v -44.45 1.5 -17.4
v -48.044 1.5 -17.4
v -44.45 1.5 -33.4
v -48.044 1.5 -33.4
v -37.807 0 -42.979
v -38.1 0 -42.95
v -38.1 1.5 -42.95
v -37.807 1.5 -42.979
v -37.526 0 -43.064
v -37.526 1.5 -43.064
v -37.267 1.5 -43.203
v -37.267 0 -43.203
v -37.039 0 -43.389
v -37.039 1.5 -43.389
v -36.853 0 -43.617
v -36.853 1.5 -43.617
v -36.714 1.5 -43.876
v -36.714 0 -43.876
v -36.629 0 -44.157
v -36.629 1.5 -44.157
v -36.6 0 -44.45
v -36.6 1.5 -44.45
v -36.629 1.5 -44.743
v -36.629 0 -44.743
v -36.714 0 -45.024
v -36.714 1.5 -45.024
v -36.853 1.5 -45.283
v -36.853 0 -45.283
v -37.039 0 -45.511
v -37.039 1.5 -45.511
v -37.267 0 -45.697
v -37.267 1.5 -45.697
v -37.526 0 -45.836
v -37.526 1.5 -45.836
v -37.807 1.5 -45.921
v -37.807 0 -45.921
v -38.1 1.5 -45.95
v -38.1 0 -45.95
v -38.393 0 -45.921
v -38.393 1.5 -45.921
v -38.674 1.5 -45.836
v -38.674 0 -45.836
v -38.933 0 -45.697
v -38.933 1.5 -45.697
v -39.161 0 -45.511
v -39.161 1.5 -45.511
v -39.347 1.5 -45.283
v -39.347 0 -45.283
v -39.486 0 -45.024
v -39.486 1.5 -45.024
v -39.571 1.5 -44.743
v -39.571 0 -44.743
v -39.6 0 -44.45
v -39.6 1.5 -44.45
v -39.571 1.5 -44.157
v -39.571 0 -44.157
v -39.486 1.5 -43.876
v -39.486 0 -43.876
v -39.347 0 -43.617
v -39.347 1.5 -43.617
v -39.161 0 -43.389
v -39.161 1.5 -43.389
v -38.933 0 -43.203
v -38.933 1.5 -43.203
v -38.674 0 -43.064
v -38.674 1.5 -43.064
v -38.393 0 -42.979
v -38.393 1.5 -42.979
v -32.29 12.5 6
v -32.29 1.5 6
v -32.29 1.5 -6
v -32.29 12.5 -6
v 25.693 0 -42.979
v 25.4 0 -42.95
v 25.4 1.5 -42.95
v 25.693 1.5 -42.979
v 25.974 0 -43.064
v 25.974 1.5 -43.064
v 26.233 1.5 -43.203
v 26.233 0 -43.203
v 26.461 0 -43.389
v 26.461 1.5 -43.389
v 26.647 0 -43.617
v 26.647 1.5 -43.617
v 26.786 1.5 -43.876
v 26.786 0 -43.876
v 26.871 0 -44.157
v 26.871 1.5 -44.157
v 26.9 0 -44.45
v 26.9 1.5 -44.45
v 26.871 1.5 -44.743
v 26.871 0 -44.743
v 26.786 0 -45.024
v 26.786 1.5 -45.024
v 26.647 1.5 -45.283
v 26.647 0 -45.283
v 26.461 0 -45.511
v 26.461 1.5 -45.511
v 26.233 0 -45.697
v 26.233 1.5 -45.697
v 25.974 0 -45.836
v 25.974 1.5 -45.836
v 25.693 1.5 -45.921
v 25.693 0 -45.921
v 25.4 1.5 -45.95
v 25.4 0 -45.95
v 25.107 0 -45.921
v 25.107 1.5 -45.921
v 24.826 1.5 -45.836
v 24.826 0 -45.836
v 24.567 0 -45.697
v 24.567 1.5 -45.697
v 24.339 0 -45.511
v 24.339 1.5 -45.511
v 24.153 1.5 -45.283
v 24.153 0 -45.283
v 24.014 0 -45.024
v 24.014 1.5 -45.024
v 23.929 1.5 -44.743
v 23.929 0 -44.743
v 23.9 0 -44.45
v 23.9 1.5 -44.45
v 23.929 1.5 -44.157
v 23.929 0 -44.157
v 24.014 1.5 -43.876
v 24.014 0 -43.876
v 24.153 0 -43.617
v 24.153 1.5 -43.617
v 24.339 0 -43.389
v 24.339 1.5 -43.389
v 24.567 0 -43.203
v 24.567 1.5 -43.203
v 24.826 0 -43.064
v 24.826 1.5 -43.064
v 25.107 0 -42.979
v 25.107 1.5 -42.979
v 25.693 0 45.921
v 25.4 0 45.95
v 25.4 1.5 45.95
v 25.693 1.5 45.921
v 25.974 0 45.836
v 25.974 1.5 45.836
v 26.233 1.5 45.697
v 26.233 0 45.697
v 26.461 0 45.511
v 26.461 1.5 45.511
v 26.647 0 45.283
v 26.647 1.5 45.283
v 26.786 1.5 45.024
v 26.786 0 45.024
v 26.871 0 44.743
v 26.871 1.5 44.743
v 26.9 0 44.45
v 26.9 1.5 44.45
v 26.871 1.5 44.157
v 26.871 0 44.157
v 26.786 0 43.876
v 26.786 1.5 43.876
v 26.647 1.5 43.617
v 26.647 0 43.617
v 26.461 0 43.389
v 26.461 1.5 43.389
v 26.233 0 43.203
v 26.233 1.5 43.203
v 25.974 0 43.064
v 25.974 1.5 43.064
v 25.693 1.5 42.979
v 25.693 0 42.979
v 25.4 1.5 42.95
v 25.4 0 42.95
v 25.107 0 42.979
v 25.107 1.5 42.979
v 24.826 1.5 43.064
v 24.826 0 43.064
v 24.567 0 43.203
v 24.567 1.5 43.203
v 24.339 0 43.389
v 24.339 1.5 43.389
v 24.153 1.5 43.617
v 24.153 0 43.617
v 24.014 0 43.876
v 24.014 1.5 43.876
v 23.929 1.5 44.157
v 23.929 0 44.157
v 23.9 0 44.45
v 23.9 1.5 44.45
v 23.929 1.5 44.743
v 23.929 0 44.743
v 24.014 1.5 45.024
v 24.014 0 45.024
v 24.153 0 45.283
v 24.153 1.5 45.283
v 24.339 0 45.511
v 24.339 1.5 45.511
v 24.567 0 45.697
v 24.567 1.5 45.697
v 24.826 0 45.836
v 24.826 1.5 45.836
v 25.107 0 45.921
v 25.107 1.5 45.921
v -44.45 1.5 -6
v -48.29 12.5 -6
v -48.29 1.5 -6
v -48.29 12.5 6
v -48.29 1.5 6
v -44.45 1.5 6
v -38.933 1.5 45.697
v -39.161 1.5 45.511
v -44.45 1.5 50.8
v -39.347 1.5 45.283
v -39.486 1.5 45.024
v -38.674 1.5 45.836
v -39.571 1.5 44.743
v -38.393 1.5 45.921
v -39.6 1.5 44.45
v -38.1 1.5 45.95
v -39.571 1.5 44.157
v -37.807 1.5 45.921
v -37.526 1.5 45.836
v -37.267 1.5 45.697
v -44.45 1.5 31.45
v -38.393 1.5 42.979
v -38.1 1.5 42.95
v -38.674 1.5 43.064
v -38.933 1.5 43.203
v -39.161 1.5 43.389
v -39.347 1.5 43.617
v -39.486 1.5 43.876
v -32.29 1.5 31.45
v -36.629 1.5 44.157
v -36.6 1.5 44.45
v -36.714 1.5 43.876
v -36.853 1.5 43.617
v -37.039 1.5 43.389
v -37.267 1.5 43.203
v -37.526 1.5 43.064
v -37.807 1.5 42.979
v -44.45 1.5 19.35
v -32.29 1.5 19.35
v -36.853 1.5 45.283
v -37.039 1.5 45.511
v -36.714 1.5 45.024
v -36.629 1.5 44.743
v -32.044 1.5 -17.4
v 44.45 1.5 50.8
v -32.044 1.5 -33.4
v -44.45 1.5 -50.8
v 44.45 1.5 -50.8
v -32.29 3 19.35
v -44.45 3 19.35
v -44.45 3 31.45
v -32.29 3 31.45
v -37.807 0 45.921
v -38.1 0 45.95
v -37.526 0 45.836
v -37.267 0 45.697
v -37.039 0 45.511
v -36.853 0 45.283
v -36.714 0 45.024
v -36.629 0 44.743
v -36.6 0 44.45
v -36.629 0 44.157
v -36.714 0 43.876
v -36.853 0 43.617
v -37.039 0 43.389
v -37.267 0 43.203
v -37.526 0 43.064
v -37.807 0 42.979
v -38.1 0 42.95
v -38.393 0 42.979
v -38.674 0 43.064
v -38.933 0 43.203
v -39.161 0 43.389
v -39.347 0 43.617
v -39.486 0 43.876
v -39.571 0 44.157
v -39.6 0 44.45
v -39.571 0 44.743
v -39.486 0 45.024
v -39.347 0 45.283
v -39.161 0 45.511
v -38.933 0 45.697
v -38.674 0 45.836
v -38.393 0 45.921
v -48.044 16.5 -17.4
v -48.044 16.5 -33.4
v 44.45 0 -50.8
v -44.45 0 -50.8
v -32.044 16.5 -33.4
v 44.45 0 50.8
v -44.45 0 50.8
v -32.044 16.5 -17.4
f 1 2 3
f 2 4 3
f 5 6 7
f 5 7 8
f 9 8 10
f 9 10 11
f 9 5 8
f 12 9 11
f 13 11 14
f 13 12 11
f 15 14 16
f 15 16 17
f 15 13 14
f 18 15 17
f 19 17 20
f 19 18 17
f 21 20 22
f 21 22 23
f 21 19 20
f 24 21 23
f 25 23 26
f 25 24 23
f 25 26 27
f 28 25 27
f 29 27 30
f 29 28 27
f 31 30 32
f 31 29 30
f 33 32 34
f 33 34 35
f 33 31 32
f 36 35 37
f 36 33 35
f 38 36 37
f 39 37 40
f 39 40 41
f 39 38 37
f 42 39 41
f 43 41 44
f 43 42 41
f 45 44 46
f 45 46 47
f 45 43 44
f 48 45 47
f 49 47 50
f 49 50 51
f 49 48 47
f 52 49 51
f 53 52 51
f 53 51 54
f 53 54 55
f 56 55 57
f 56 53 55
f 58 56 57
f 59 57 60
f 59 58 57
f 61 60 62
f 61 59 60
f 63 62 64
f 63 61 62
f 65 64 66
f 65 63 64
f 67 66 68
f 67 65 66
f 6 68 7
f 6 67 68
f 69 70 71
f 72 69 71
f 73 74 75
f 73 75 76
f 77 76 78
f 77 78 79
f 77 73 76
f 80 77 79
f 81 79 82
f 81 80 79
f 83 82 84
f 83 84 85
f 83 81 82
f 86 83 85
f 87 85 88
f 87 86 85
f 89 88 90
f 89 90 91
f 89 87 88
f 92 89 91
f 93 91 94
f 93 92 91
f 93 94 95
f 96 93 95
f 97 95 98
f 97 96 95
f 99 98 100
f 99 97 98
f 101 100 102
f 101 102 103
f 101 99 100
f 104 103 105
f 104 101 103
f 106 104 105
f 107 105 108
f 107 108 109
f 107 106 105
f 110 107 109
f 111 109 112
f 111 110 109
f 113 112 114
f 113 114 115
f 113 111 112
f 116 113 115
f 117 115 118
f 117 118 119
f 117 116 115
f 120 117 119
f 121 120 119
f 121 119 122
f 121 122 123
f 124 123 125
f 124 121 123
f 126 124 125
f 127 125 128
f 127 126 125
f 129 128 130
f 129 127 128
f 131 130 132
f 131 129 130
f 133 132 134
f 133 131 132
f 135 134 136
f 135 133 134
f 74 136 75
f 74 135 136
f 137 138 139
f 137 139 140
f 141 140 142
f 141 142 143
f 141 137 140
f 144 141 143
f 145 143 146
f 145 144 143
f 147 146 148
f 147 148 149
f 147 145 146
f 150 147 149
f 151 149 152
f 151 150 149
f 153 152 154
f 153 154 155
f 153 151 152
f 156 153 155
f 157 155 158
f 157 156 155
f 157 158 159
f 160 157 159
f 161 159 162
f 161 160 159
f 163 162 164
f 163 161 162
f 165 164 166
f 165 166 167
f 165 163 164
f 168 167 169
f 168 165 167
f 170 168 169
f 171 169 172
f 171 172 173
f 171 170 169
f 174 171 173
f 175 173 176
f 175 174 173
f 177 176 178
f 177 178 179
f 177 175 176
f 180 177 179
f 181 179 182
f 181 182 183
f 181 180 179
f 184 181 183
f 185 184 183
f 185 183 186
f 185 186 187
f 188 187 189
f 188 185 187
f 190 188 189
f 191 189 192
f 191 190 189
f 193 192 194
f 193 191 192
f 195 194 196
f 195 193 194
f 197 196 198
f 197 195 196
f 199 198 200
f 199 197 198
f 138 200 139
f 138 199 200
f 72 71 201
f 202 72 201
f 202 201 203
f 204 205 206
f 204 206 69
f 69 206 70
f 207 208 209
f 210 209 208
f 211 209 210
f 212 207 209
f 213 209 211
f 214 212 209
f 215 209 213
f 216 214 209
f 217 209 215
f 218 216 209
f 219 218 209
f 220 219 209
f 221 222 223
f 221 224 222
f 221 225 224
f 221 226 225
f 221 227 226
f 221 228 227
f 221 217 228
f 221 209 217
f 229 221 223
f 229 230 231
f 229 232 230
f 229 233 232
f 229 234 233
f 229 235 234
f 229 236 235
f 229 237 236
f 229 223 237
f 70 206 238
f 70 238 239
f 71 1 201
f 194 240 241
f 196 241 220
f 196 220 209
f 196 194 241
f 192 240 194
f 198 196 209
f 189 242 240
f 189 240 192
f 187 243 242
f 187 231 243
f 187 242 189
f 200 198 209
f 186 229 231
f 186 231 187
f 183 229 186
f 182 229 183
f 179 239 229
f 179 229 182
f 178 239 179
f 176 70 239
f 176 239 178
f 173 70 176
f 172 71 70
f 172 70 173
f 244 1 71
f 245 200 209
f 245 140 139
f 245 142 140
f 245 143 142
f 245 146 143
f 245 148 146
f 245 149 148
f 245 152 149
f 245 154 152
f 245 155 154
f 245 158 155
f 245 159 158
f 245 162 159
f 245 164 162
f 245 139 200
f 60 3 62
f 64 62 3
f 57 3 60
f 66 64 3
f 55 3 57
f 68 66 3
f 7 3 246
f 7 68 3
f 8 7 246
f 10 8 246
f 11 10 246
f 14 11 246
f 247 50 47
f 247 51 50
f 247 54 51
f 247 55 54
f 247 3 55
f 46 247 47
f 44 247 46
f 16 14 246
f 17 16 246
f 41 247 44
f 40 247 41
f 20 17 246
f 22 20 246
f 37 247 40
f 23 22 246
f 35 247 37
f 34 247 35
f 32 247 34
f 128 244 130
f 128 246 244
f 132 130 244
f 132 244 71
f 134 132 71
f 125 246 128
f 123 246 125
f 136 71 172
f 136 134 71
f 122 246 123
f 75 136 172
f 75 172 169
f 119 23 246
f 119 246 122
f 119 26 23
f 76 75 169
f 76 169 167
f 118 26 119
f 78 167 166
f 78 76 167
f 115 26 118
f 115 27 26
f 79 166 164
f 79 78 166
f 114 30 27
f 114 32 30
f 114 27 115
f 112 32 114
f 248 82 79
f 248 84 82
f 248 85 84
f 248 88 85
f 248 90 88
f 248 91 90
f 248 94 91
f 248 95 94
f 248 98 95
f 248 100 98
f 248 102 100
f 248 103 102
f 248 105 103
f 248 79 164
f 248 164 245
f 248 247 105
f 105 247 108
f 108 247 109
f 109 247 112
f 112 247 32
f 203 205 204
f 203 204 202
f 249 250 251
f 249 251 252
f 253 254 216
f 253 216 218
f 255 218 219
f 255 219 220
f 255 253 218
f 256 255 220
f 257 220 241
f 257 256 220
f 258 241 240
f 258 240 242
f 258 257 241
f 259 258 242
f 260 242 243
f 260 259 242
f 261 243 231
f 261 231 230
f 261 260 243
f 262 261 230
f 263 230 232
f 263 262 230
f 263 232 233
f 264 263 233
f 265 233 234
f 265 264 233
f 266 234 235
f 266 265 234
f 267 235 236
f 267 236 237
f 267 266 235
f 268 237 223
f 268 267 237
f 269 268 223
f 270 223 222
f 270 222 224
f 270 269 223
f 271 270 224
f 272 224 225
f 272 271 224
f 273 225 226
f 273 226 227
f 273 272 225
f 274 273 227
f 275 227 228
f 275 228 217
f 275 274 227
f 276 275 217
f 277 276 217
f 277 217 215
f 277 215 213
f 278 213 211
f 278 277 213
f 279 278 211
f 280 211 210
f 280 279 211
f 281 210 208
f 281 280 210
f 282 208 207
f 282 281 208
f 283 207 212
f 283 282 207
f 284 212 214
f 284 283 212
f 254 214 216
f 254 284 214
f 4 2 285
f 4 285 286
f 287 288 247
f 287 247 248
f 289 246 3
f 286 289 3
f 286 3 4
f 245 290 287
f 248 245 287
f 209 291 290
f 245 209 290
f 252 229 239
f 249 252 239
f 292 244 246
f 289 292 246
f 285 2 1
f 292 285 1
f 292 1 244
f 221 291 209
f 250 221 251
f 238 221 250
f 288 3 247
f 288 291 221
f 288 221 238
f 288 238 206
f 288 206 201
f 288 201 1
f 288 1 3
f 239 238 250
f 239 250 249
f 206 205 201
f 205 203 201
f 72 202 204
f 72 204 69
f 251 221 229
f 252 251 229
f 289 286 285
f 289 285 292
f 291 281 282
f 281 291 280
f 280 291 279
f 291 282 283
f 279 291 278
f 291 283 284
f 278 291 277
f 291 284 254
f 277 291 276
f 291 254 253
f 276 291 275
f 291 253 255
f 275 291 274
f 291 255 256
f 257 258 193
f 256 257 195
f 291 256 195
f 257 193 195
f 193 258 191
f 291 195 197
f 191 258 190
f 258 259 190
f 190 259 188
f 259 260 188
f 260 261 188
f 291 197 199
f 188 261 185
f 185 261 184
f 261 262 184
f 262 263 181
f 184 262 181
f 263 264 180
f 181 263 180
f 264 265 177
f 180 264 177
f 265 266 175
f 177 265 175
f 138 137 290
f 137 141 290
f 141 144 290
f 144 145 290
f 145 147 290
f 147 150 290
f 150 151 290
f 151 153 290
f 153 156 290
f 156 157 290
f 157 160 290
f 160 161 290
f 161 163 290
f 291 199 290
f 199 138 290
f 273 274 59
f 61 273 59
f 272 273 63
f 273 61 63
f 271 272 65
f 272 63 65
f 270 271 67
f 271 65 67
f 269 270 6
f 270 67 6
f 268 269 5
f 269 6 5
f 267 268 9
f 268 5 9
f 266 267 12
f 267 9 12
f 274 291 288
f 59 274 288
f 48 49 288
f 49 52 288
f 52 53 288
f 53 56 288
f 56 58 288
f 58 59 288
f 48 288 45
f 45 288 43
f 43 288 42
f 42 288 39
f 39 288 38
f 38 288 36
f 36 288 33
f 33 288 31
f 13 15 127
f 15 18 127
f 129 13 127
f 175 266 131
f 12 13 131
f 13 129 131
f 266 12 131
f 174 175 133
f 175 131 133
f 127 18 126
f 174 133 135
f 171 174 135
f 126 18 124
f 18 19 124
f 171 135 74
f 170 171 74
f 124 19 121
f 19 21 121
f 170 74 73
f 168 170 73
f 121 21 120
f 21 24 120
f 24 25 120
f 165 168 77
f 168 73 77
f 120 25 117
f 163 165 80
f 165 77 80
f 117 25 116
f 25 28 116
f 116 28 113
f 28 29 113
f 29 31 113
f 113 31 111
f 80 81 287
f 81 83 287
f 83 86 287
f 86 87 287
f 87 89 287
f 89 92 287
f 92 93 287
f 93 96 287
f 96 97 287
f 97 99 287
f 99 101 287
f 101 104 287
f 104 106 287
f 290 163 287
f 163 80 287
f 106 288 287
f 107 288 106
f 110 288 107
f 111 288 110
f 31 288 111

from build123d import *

# Parameters (mm, degrees)
SKETCH1_W           = 88.9
SKETCH1_H           = 101.6
SKETCH1_R           = 1.5
BOSS_EXTRUDE1_DEPTH = 1.5
SKETCH3_W           = 16
SKETCH3_H           = 16
BOSS_EXTRUDE2_DEPTH = 15
SKETCH3_3_W         = 16
SKETCH3_3_H         = 12
BOSS_EXTRUDE3_DEPTH = 11
SKETCH3_4_W         = 12.16
SKETCH3_4_H         = 12.1
BOSS_EXTRUDE4_DEPTH = 1.5


with BuildPart() as part:
    # Sketch1 → Boss-Extrude1 (new body)
    with BuildSketch(Plane(origin=(0, 0, 0), x_dir=(1, 0, 0), z_dir=(0, 1, 0))):
        Rectangle(SKETCH1_W, SKETCH1_H)
        with Locations((-38.1, -44.45)):
            Circle(SKETCH1_R, mode=Mode.SUBTRACT)
        with Locations((25.4, -44.45)):
            Circle(SKETCH1_R, mode=Mode.SUBTRACT)
        with Locations((-38.1, 44.45)):
            Circle(SKETCH1_R, mode=Mode.SUBTRACT)
        with Locations((25.4, 44.45)):
            Circle(SKETCH1_R, mode=Mode.SUBTRACT)
    extrude(amount=BOSS_EXTRUDE1_DEPTH)

    # Sketch3 → Boss-Extrude2 (add)
    with BuildSketch(Plane(origin=(0, 1.5, 0), x_dir=(1, 0, 0), z_dir=(0, 1, 0))):
        with Locations((-40.044, 25.4)):
            Rectangle(SKETCH3_W, SKETCH3_H)
    extrude(amount=BOSS_EXTRUDE2_DEPTH)

    # Sketch3<3> → Boss-Extrude3 (add)
    with BuildSketch(Plane(origin=(0, 1.5, 0), x_dir=(1, 0, 0), z_dir=(0, 1, 0))):
        with Locations((-40.29, 0)):
            Rectangle(SKETCH3_3_W, SKETCH3_3_H)
    extrude(amount=BOSS_EXTRUDE3_DEPTH)

    # Sketch3<4> → Boss-Extrude4 (add)
    with BuildSketch(Plane(origin=(0, 1.5, 0), x_dir=(1, 0, 0), z_dir=(0, 1, 0))):
        with Locations((-38.37, -25.4)):
            Rectangle(SKETCH3_4_W, SKETCH3_4_H)
    extrude(amount=BOSS_EXTRUDE4_DEPTH)


solid = part.part
